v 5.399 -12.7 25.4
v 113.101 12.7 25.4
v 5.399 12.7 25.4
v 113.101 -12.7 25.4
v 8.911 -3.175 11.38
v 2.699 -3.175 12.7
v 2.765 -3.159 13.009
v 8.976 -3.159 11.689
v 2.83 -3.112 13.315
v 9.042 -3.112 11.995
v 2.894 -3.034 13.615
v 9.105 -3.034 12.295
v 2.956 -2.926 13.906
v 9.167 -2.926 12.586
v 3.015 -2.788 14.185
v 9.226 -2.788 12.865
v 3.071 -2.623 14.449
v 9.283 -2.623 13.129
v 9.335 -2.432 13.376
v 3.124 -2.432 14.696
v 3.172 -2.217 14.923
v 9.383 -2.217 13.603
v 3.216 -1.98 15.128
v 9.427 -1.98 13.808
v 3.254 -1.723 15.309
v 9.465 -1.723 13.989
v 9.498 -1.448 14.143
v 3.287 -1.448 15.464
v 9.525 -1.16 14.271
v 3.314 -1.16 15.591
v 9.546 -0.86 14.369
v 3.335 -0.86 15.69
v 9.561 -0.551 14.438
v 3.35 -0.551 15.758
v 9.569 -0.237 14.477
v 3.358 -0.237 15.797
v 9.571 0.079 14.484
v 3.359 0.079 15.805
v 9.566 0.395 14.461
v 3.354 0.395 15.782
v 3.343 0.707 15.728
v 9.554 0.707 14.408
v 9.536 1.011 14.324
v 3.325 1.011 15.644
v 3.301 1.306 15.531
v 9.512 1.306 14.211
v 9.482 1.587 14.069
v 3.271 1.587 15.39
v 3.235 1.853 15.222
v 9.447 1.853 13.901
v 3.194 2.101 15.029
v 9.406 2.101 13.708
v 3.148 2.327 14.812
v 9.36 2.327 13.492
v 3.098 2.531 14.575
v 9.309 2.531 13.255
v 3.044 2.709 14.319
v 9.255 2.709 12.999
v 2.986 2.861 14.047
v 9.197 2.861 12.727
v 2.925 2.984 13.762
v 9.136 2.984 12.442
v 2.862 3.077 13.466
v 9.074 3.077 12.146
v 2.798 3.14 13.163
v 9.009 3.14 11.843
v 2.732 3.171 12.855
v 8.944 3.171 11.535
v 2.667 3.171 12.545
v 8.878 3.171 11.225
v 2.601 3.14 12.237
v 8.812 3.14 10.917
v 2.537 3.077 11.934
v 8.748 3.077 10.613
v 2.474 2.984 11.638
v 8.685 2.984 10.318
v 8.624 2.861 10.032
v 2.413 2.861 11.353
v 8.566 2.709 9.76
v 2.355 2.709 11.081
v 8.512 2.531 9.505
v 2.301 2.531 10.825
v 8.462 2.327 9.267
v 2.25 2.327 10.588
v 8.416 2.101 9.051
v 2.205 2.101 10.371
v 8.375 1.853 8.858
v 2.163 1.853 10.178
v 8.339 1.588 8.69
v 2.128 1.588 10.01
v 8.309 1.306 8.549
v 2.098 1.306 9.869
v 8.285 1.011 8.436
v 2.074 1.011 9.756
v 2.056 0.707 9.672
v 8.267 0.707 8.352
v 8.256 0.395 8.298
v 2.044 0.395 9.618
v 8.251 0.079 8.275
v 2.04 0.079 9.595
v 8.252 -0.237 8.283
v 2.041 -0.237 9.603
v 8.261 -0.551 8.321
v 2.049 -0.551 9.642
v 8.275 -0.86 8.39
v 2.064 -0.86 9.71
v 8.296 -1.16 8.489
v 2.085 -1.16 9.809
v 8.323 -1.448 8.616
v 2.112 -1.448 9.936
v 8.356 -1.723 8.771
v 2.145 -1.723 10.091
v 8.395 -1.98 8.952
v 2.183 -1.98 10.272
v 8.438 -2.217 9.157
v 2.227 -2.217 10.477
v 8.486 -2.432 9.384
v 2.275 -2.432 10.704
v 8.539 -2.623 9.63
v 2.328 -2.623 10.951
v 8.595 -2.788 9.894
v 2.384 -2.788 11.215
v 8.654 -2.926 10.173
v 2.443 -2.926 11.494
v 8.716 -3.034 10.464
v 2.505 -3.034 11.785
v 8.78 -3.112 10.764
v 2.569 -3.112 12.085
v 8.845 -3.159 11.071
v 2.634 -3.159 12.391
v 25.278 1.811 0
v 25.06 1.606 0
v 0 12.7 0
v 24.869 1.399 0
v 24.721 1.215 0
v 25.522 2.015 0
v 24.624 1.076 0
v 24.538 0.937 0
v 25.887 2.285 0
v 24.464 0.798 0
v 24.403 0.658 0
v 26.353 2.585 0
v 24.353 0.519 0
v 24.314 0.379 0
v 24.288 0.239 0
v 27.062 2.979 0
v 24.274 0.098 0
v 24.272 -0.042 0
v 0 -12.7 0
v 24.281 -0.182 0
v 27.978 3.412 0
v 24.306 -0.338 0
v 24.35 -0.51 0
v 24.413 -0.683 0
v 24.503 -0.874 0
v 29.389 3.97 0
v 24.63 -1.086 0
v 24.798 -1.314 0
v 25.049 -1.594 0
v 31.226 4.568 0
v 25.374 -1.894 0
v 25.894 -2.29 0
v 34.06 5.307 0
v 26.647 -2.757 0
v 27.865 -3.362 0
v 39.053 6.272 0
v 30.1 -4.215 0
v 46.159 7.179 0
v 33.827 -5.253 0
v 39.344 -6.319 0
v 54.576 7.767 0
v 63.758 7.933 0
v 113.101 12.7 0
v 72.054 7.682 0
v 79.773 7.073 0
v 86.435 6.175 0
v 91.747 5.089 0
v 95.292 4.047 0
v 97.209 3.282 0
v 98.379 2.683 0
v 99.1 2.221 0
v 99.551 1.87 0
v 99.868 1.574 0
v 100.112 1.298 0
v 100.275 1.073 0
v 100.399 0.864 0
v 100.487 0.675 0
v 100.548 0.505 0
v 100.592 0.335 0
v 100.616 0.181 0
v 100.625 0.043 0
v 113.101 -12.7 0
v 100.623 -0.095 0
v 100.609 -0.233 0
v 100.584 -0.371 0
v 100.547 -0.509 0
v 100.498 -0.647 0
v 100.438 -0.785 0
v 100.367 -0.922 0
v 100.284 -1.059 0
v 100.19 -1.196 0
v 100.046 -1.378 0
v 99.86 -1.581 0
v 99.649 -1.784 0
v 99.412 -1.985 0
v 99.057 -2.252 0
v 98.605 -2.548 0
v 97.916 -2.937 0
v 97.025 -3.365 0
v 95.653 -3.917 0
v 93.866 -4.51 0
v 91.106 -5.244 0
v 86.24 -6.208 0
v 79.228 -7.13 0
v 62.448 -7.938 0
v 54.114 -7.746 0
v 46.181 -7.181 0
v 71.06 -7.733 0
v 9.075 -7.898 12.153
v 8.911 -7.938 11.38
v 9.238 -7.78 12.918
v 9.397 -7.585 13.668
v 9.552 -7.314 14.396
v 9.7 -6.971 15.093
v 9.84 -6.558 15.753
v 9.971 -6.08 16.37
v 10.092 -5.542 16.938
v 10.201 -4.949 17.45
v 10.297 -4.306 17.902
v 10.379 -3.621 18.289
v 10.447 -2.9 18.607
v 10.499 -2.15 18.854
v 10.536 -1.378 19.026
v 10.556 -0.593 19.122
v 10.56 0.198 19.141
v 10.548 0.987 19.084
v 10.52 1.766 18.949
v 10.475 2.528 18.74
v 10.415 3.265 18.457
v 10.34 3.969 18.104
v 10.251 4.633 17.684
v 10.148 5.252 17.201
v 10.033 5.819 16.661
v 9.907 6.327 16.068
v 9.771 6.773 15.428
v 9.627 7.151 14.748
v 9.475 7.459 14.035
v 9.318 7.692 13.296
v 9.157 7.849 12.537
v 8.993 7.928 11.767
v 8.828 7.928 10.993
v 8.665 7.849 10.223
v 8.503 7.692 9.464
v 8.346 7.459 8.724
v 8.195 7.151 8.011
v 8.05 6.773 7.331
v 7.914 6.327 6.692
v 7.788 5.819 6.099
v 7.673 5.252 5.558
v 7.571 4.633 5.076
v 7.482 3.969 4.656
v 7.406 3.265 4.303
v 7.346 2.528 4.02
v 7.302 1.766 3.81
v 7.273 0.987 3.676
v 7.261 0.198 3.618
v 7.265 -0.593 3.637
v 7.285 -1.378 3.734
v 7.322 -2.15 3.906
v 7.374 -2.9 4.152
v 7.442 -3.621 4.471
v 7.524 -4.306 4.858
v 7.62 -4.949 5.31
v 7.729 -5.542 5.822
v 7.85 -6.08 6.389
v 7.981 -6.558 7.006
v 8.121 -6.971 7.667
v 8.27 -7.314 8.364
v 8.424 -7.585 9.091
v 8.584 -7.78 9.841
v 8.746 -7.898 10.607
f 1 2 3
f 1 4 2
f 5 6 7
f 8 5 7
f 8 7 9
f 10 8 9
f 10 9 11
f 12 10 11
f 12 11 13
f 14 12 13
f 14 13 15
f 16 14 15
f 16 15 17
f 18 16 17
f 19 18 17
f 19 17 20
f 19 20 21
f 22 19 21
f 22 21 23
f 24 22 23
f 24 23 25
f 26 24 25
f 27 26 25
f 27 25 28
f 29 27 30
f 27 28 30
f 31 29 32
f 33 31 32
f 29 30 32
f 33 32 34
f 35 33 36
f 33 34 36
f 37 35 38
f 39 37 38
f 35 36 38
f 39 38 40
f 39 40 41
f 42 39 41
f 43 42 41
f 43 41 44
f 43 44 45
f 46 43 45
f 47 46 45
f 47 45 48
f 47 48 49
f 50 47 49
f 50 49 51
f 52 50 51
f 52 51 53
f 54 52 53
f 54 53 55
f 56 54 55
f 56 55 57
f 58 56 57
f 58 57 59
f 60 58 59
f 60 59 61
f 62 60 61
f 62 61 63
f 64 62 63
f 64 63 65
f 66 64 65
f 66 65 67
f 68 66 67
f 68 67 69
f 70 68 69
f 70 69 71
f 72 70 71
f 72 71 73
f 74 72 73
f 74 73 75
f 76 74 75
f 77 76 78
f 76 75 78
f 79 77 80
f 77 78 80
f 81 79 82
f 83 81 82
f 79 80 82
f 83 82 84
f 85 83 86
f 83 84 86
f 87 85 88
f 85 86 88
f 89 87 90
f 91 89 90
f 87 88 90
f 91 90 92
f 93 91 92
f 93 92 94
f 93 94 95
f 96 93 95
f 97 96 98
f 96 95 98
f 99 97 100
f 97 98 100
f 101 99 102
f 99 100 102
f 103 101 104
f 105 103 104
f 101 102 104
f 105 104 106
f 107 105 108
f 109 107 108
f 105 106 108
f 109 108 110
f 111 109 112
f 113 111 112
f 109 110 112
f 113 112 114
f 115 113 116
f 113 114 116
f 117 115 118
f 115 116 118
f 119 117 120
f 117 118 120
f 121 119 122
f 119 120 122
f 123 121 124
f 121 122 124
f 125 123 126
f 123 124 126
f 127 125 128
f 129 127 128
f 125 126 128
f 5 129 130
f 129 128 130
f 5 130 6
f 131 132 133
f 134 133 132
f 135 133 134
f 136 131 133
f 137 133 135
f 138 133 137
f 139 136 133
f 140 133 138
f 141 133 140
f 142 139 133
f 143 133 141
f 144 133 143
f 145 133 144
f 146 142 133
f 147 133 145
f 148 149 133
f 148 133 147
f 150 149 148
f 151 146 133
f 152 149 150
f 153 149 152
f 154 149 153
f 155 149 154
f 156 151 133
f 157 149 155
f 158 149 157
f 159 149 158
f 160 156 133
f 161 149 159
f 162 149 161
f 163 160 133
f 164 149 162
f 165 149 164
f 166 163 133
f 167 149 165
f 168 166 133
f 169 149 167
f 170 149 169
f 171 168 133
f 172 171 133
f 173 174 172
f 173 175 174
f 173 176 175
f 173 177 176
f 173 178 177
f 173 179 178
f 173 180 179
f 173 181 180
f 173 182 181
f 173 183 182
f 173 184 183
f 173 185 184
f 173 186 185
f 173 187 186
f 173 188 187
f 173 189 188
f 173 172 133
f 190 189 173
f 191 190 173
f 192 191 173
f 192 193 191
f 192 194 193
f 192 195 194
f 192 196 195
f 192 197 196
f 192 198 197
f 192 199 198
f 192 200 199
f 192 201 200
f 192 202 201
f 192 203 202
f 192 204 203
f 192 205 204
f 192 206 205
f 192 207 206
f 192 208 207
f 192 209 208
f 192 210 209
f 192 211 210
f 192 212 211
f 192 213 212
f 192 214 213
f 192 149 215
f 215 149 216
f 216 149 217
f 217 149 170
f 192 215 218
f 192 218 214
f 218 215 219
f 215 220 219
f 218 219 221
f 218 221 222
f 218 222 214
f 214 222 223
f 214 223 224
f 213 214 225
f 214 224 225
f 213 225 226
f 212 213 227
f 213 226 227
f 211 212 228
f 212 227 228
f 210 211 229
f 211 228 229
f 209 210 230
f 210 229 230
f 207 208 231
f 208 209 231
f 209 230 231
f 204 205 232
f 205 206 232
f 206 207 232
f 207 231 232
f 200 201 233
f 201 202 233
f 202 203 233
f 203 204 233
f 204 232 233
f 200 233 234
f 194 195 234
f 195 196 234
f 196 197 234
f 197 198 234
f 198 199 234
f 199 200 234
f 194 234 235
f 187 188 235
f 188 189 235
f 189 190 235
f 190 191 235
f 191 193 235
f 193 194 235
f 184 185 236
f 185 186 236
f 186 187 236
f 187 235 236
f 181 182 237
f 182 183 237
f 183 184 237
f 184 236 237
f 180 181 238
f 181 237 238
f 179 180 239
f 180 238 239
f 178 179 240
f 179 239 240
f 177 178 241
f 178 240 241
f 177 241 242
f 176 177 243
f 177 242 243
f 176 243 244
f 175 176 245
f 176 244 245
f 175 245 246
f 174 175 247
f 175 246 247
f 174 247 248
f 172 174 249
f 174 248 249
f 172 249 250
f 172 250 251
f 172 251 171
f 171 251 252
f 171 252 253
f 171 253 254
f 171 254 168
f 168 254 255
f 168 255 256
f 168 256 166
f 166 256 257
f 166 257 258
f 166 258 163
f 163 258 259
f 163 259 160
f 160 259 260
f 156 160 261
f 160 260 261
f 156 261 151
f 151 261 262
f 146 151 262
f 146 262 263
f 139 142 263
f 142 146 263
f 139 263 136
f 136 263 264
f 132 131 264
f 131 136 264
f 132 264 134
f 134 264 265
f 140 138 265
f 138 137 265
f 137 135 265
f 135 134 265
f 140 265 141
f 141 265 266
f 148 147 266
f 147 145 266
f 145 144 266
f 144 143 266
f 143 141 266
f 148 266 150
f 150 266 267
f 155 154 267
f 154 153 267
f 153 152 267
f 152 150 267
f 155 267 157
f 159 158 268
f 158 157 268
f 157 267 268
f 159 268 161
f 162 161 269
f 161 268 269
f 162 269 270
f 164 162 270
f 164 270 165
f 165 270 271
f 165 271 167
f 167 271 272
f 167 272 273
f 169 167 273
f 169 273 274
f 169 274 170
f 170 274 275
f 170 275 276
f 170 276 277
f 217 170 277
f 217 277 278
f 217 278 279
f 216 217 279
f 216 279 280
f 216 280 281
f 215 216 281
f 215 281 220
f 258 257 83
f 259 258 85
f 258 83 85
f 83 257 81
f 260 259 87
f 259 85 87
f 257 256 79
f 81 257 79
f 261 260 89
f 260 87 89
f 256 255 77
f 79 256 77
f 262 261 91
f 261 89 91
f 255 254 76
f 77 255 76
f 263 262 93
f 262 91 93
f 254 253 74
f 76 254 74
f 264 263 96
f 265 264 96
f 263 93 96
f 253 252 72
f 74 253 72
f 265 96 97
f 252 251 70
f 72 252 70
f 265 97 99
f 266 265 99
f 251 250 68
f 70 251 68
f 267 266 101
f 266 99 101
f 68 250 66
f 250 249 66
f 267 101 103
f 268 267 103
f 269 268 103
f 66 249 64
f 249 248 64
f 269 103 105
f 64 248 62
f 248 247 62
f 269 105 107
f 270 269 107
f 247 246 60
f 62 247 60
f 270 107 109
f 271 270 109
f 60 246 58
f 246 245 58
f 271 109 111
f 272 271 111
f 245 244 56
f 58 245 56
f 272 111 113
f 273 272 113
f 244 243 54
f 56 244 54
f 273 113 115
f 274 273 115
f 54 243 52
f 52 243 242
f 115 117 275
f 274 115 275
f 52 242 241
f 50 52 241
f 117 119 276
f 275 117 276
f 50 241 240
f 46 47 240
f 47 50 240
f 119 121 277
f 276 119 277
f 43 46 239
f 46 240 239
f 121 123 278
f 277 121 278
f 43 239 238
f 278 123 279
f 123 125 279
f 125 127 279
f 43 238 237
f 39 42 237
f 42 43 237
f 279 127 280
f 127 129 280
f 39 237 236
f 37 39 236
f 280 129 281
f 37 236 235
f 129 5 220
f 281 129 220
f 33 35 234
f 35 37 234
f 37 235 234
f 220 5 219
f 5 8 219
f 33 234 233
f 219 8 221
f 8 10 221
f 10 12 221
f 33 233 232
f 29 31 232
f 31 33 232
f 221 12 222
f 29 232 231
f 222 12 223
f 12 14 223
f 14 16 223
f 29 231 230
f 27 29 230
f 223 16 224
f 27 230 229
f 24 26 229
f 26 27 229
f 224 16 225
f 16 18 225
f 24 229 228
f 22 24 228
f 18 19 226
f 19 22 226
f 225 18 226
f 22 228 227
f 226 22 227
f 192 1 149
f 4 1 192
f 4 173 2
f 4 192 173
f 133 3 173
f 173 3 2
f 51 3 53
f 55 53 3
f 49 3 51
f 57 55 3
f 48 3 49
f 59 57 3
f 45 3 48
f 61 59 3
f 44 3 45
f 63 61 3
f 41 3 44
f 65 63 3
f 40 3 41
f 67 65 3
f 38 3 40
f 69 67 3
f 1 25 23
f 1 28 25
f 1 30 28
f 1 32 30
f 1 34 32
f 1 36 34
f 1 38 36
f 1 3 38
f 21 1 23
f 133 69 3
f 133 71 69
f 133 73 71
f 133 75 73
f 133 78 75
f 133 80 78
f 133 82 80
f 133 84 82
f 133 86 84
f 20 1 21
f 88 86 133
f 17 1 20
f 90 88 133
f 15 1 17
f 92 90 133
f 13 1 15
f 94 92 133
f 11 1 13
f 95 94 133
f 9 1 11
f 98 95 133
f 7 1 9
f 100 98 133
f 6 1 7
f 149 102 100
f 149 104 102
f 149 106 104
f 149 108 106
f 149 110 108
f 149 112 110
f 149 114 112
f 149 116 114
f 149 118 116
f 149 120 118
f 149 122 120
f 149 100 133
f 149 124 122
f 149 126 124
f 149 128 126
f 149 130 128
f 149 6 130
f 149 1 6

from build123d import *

# Parameters (mm, degrees)
F1_DEPTH = 12.7
F2_R     = 3.175
F3_DEPTH = 110.6302371448
F5_R     = 7.9375
F5_R_2   = 3.175
F6_DEPTH = 104.2802371448


with BuildPart() as f1:
    # F0 (on Front) → F1 (new body, symmetric)
    with BuildSketch(Plane.XZ):
        Polygon((113.1007601121, 25.4), (5.3989366664, 25.4), (0, 0), (113.1007601121, 0), align=None)
    extrude(amount=F1_DEPTH, both=True)

    # F2 (on face) → F3 (cut, through all)
    with BuildSketch(Plane(origin=(0, 0, 0), x_dir=(0, -1, 0), z_dir=(-0.9781476007, 0, 0.2079116908))):
        with Locations((0, 12.9837255548)):
            Circle(F2_R)
    extrude(amount=-F3_DEPTH, mode=Mode.SUBTRACT)

    # F5 (on offset) → F6 (cut, through all)
    with BuildSketch(Plane(origin=(6.2112372647, 0, -1.3202392367), x_dir=(0, -1, 0), z_dir=(-0.9781476007, 0, 0.2079116908))):
        with Locations((0, 12.9837255548)):
            Circle(F5_R)
        with Locations((0, 12.9837255548)):
            Circle(F5_R_2, mode=Mode.SUBTRACT)
    extrude(amount=-F6_DEPTH, mode=Mode.SUBTRACT)


solid = f1.part
